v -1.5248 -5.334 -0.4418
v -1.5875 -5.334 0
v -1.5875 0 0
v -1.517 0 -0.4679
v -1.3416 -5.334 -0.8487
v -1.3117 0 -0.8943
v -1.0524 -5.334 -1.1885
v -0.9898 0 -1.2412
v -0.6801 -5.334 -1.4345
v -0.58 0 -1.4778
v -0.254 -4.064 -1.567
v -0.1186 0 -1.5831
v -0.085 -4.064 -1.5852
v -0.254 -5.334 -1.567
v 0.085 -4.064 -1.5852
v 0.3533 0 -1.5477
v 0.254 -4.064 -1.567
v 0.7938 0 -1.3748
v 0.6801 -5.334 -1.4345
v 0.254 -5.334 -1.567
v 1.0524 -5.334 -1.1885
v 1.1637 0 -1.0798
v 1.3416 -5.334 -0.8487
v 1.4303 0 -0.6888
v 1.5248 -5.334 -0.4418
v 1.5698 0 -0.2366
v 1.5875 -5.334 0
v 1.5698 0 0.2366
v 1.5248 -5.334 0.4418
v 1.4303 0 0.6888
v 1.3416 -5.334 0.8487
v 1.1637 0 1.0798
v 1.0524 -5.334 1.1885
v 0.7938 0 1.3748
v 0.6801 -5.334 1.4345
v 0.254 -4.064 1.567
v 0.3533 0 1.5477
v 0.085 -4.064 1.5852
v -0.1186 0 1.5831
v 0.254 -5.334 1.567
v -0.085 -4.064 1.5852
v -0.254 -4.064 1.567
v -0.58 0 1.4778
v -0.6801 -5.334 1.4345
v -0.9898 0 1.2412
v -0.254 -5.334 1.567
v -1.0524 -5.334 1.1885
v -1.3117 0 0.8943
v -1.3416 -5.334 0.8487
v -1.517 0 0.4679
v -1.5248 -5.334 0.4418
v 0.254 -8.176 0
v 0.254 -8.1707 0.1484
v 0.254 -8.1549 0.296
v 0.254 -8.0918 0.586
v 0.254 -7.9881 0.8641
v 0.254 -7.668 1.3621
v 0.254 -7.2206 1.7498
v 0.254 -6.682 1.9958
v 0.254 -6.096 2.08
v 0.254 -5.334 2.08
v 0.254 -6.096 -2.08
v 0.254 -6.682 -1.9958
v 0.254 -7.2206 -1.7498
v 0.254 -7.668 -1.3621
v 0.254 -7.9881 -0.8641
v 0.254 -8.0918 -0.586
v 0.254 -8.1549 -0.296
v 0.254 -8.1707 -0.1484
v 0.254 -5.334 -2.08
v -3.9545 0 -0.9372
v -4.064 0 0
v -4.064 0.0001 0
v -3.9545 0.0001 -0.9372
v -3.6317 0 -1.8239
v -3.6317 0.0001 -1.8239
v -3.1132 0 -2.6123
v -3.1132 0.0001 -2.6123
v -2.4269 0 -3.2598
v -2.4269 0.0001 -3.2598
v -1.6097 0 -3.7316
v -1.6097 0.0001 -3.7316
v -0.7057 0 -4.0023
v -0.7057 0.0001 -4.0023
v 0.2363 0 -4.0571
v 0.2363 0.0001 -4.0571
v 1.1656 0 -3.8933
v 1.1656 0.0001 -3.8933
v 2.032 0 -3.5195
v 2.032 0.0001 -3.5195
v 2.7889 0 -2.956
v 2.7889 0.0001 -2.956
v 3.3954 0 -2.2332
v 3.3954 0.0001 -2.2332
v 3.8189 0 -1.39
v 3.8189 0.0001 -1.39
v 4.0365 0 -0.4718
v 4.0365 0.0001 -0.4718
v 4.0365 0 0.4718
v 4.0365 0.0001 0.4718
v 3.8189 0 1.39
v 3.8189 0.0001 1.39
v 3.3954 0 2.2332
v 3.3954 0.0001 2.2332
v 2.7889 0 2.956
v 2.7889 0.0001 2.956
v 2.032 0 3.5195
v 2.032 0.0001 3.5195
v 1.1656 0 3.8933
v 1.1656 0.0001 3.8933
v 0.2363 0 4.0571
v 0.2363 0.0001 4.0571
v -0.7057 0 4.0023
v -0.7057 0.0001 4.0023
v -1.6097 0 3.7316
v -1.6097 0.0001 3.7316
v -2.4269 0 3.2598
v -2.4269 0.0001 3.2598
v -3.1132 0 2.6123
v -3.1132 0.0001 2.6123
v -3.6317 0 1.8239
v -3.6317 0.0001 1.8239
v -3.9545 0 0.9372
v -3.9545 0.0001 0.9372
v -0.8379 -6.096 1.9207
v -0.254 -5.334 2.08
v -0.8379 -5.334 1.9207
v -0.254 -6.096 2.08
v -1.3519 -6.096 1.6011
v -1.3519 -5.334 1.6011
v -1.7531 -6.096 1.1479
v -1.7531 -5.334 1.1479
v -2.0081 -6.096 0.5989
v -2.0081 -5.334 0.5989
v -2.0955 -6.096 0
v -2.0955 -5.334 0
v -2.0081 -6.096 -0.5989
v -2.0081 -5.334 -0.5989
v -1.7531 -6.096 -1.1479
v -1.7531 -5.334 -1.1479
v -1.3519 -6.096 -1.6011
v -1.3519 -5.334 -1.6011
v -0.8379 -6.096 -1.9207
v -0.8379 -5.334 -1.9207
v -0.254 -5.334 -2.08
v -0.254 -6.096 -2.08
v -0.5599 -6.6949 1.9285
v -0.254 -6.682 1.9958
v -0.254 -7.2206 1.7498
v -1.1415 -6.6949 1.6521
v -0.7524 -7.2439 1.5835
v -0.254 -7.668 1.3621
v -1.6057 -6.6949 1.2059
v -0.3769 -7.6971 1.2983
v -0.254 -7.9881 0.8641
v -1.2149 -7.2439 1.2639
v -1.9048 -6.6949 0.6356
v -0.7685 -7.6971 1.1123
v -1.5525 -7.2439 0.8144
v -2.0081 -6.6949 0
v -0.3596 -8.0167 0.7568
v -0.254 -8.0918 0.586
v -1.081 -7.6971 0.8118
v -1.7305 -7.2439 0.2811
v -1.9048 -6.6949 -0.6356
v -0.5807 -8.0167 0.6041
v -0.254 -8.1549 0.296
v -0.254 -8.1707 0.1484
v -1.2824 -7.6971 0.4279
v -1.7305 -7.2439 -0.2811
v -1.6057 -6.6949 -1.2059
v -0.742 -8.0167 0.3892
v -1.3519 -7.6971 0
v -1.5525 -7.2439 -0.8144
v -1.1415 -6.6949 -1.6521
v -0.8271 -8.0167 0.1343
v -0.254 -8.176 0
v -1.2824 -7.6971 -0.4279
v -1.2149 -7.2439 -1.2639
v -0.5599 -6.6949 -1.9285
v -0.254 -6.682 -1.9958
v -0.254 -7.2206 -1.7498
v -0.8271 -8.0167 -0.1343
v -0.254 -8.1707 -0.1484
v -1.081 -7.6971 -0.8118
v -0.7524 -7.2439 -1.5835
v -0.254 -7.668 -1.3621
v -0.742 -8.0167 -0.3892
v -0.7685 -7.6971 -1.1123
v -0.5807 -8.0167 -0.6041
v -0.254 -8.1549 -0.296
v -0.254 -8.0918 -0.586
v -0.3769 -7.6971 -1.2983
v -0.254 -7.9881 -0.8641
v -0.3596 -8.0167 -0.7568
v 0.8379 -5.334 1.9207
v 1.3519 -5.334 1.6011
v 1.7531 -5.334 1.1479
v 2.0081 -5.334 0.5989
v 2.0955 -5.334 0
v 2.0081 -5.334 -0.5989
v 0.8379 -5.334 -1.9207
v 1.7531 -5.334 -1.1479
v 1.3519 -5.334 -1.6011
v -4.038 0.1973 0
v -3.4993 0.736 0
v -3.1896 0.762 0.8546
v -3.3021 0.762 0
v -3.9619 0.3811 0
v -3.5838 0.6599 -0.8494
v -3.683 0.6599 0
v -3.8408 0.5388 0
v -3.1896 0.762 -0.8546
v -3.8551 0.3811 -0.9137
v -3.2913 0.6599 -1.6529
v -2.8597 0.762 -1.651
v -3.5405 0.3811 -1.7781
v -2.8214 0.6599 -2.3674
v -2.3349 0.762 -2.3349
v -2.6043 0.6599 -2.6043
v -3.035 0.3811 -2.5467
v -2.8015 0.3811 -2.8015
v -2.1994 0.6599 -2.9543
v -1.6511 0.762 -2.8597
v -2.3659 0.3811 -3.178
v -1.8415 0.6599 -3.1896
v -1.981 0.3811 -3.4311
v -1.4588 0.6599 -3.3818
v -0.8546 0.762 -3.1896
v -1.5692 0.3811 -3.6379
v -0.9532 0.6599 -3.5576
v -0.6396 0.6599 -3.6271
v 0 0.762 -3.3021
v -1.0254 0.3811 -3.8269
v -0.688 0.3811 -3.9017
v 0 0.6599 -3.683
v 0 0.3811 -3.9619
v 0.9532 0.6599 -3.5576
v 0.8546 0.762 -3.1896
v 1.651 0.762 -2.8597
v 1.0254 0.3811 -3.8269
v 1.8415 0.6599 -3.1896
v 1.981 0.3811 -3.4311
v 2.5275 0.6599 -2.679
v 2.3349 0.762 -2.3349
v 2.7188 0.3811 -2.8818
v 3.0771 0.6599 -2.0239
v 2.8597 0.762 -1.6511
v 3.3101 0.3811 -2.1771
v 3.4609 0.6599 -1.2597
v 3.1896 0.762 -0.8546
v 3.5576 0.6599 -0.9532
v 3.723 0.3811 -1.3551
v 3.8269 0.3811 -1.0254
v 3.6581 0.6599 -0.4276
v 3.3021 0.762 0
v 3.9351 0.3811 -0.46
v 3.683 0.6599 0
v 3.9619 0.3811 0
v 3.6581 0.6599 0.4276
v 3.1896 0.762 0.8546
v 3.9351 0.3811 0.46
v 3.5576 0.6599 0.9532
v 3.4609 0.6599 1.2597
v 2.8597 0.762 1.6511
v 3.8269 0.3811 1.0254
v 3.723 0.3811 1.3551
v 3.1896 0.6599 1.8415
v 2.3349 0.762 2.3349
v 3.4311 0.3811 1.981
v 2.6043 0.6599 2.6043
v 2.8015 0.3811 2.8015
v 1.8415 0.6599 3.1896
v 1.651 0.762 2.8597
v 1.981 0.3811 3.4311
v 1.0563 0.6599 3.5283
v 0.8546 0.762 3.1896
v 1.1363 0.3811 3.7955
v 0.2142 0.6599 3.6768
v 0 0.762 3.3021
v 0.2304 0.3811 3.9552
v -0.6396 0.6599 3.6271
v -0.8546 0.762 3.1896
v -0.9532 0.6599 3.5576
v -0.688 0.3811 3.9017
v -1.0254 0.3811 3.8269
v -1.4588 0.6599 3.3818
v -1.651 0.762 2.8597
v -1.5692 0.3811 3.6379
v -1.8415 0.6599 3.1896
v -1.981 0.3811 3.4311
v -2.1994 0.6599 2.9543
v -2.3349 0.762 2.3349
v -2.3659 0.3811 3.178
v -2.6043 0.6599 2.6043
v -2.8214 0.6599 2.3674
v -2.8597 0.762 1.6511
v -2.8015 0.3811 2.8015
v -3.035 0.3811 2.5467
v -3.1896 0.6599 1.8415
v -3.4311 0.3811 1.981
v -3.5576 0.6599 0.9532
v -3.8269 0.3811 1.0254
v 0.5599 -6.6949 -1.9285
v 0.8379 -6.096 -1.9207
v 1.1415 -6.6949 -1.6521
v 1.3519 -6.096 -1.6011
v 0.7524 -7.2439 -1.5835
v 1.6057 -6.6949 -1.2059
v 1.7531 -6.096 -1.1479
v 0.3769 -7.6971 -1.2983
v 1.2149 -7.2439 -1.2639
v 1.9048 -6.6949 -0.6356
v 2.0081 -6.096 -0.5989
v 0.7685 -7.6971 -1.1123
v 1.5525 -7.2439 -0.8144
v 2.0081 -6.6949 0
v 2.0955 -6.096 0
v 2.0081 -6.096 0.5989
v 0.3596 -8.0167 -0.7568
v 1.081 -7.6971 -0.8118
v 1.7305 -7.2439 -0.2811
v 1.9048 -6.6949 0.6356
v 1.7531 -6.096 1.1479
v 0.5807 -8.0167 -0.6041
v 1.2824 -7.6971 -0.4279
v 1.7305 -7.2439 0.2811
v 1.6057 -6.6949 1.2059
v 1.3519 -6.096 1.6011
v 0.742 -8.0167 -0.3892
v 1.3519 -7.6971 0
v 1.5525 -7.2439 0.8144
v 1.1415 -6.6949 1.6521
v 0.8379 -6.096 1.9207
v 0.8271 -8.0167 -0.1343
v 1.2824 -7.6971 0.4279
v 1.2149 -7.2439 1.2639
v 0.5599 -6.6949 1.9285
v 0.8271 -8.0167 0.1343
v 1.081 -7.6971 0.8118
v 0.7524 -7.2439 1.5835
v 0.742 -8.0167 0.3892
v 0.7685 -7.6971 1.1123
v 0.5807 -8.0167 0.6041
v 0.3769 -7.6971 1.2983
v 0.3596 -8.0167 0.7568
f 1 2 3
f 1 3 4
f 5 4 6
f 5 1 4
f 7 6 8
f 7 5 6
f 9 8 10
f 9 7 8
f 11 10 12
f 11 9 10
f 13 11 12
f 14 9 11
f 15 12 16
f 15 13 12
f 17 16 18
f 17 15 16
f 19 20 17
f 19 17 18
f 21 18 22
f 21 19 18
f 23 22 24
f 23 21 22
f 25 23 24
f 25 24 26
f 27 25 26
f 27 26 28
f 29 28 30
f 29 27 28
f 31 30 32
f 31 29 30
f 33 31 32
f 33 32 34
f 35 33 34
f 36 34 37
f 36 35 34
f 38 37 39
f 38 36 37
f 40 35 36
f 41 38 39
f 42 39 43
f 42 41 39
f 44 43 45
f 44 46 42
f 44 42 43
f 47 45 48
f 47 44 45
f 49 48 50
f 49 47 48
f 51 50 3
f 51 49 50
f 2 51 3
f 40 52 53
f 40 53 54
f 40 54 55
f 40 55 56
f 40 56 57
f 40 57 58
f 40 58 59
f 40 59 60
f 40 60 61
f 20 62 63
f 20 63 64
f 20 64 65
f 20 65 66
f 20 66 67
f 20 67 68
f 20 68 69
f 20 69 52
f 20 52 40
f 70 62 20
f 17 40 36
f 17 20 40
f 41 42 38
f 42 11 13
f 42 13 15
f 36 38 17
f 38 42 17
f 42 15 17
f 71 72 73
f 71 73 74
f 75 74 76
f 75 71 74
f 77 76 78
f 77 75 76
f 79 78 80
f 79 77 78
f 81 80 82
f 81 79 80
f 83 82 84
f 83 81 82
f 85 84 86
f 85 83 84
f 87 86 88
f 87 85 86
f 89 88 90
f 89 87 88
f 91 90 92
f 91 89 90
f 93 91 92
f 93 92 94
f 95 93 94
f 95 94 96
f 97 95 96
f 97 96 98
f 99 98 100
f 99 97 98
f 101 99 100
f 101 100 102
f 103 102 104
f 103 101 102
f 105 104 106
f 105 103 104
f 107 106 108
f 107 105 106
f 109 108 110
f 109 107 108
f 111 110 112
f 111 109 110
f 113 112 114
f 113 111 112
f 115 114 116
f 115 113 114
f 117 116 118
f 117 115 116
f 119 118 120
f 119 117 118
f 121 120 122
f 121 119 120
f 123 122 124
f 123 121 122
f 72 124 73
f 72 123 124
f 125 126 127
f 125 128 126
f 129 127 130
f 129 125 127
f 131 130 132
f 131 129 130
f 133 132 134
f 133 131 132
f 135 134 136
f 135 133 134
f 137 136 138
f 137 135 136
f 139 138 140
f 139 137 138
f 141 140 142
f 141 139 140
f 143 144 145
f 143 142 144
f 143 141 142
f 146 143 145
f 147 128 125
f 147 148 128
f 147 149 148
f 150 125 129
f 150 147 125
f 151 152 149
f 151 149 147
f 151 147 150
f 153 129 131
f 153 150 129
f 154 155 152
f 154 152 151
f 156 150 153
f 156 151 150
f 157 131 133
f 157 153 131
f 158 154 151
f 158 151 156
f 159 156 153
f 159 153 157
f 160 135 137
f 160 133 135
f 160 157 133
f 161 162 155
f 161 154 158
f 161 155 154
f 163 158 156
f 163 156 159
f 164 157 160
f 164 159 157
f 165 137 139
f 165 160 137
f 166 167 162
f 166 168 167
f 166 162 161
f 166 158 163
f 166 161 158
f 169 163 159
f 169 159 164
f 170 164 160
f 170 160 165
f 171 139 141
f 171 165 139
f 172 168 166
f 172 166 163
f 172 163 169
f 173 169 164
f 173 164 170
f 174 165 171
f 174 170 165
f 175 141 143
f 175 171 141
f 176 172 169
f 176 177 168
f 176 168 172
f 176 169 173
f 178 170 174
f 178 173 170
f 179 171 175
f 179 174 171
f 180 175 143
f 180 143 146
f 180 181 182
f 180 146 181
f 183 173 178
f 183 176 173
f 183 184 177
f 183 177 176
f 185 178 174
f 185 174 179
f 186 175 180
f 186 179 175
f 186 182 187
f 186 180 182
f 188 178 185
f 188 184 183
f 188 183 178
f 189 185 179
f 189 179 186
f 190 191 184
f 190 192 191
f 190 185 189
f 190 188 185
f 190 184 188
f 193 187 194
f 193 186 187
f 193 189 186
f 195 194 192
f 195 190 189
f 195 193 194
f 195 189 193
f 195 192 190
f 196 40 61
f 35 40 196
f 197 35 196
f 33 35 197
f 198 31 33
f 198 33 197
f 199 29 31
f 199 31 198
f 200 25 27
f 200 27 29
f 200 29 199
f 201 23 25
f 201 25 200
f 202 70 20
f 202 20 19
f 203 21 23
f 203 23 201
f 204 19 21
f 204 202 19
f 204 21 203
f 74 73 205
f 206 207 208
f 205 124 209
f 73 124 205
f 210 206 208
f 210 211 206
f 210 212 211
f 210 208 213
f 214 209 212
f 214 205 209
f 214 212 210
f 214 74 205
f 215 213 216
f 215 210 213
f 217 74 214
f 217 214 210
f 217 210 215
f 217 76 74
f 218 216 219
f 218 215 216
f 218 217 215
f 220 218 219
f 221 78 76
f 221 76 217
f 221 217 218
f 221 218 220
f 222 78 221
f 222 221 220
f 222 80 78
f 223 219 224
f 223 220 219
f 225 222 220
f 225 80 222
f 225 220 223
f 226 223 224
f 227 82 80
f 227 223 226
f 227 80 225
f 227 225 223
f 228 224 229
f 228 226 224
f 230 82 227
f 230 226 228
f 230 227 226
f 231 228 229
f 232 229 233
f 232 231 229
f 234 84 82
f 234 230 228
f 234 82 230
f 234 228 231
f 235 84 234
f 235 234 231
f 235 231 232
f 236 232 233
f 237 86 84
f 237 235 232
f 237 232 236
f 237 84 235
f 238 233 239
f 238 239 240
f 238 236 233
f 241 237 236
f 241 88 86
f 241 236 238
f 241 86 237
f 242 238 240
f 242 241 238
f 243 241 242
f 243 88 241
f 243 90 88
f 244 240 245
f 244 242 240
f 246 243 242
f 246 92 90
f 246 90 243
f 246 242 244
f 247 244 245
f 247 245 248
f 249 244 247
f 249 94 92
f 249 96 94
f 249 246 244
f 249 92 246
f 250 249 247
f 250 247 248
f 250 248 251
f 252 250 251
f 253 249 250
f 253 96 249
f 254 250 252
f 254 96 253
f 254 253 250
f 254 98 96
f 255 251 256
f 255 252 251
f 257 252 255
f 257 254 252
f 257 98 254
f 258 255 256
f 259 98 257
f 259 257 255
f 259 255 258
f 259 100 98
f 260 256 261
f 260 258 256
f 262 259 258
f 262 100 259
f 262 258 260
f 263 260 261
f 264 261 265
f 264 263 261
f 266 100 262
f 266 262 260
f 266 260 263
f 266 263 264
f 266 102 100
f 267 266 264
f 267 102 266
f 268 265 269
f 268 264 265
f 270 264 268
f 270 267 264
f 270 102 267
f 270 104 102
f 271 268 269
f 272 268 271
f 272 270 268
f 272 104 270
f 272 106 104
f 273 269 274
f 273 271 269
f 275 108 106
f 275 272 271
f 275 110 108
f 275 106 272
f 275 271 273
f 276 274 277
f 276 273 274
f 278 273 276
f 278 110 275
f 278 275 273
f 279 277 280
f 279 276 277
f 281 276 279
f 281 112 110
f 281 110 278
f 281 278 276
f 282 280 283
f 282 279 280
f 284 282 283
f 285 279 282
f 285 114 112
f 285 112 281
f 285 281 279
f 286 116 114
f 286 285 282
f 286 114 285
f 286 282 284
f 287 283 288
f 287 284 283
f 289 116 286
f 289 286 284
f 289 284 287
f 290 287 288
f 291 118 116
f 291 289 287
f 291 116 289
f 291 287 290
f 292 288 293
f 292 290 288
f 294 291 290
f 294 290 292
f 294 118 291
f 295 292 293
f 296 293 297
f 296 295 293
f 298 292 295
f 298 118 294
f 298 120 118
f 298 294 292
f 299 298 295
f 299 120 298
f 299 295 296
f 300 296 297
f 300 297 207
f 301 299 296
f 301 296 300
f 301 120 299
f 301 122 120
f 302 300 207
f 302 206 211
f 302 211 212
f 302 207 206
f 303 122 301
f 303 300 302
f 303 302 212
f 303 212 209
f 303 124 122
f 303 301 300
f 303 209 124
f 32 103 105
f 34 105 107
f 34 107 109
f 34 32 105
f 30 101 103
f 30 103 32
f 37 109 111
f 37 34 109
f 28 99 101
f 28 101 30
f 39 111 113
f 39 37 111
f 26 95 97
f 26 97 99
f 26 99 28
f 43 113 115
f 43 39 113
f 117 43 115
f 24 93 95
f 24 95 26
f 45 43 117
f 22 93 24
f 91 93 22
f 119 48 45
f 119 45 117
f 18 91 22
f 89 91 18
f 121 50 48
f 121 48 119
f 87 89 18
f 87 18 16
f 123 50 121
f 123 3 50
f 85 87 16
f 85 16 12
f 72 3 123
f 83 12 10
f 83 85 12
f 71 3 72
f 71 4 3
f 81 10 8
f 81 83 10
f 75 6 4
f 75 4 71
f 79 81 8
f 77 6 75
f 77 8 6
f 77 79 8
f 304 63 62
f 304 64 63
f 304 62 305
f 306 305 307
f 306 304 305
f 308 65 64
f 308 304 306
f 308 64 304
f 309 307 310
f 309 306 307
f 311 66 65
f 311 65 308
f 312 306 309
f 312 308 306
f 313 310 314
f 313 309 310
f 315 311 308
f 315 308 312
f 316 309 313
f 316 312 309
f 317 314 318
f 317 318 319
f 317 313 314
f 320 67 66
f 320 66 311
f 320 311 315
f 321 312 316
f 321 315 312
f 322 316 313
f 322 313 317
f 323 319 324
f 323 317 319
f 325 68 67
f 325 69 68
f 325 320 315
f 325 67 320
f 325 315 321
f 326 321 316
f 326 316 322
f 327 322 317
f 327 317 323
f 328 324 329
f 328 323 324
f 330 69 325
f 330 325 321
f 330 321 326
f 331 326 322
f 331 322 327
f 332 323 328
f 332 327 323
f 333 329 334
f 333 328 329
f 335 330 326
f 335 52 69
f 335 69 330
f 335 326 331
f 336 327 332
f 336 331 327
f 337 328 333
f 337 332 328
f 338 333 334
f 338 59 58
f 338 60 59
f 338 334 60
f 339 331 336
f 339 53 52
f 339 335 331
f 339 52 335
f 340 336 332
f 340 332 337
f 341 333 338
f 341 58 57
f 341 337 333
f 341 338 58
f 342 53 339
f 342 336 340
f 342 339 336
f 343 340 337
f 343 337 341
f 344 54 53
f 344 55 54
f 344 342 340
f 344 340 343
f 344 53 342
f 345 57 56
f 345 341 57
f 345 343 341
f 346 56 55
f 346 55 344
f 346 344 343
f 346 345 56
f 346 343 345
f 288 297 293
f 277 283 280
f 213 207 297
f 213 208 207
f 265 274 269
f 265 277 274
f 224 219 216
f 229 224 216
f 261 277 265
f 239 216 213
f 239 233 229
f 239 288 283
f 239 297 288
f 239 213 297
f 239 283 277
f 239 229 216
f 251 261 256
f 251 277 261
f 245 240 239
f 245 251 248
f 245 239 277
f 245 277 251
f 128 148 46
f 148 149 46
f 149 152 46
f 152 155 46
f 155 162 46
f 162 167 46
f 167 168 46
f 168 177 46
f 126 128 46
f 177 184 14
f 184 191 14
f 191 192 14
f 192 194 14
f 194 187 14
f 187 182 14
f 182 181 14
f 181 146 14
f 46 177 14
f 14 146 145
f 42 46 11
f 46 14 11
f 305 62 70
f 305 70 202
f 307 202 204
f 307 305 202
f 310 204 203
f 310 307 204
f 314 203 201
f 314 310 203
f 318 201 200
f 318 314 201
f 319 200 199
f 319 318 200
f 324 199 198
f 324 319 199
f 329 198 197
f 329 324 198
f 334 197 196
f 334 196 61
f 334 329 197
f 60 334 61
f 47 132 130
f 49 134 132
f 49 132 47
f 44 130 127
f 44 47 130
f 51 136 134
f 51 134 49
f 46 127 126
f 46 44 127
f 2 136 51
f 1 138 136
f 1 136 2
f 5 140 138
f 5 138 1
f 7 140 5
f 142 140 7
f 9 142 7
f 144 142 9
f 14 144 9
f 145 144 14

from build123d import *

# Parameters (mm, degrees)
FILLET1_R       = 0.762
SLOT_DEPTH      = 11.006641007
SLOT_DEPTH_BACK = 11.006641007
SKETCH2_W       = 0.508
SKETCH2_H       = 4.1275


with BuildPart() as part:
    # Sketch1 → Base-Revolve (revolve)
    with BuildSketch(Plane.XY, mode=Mode.PRIVATE) as base_revolve_sk:
        with BuildLine():
            Line((0, 0.762), (4.064, 0.762))
            Line((4.064, 0.762), (4.064, 0))
            Line((4.064, 0), (1.5875, 0))
            Line((1.5875, 0), (1.5875, -5.334))
            Line((1.5875, -5.334), (2.0955, -5.334))
            Line((2.0955, -5.334), (2.0955, -6.096))
            ThreePointArc((2.0955, -6.096), (1.48174226, -7.57774226), (0, -8.1915))
            Line((0, -8.1915), (0, 0.762))
        make_face()
    revolve(base_revolve_sk.sketch.rotate(Axis((0, 0, 0), (0, -1, 0)), 180), axis=Axis((0, 0, 0), (0, -1, 0)))

    # Fillet1
    fillet1_edges = [part.edges().sort_by_distance(p)[0] for p in [
        (4.064, 0.762, 0),
    ]]
    fillet(fillet1_edges, radius=FILLET1_R - 0.0001)  # a hair under: the kernel refuses the full size

    # Sketch2 → Slot (cut, two sides: drawn at the far end of the back side and taken through both)
    with BuildSketch(Plane.XY.offset(-SLOT_DEPTH_BACK)):
        with Locations((0, -6.12775)):
            Rectangle(SKETCH2_W, SKETCH2_H)
    extrude(amount=SLOT_DEPTH + SLOT_DEPTH_BACK, mode=Mode.SUBTRACT)


solid = part.part
